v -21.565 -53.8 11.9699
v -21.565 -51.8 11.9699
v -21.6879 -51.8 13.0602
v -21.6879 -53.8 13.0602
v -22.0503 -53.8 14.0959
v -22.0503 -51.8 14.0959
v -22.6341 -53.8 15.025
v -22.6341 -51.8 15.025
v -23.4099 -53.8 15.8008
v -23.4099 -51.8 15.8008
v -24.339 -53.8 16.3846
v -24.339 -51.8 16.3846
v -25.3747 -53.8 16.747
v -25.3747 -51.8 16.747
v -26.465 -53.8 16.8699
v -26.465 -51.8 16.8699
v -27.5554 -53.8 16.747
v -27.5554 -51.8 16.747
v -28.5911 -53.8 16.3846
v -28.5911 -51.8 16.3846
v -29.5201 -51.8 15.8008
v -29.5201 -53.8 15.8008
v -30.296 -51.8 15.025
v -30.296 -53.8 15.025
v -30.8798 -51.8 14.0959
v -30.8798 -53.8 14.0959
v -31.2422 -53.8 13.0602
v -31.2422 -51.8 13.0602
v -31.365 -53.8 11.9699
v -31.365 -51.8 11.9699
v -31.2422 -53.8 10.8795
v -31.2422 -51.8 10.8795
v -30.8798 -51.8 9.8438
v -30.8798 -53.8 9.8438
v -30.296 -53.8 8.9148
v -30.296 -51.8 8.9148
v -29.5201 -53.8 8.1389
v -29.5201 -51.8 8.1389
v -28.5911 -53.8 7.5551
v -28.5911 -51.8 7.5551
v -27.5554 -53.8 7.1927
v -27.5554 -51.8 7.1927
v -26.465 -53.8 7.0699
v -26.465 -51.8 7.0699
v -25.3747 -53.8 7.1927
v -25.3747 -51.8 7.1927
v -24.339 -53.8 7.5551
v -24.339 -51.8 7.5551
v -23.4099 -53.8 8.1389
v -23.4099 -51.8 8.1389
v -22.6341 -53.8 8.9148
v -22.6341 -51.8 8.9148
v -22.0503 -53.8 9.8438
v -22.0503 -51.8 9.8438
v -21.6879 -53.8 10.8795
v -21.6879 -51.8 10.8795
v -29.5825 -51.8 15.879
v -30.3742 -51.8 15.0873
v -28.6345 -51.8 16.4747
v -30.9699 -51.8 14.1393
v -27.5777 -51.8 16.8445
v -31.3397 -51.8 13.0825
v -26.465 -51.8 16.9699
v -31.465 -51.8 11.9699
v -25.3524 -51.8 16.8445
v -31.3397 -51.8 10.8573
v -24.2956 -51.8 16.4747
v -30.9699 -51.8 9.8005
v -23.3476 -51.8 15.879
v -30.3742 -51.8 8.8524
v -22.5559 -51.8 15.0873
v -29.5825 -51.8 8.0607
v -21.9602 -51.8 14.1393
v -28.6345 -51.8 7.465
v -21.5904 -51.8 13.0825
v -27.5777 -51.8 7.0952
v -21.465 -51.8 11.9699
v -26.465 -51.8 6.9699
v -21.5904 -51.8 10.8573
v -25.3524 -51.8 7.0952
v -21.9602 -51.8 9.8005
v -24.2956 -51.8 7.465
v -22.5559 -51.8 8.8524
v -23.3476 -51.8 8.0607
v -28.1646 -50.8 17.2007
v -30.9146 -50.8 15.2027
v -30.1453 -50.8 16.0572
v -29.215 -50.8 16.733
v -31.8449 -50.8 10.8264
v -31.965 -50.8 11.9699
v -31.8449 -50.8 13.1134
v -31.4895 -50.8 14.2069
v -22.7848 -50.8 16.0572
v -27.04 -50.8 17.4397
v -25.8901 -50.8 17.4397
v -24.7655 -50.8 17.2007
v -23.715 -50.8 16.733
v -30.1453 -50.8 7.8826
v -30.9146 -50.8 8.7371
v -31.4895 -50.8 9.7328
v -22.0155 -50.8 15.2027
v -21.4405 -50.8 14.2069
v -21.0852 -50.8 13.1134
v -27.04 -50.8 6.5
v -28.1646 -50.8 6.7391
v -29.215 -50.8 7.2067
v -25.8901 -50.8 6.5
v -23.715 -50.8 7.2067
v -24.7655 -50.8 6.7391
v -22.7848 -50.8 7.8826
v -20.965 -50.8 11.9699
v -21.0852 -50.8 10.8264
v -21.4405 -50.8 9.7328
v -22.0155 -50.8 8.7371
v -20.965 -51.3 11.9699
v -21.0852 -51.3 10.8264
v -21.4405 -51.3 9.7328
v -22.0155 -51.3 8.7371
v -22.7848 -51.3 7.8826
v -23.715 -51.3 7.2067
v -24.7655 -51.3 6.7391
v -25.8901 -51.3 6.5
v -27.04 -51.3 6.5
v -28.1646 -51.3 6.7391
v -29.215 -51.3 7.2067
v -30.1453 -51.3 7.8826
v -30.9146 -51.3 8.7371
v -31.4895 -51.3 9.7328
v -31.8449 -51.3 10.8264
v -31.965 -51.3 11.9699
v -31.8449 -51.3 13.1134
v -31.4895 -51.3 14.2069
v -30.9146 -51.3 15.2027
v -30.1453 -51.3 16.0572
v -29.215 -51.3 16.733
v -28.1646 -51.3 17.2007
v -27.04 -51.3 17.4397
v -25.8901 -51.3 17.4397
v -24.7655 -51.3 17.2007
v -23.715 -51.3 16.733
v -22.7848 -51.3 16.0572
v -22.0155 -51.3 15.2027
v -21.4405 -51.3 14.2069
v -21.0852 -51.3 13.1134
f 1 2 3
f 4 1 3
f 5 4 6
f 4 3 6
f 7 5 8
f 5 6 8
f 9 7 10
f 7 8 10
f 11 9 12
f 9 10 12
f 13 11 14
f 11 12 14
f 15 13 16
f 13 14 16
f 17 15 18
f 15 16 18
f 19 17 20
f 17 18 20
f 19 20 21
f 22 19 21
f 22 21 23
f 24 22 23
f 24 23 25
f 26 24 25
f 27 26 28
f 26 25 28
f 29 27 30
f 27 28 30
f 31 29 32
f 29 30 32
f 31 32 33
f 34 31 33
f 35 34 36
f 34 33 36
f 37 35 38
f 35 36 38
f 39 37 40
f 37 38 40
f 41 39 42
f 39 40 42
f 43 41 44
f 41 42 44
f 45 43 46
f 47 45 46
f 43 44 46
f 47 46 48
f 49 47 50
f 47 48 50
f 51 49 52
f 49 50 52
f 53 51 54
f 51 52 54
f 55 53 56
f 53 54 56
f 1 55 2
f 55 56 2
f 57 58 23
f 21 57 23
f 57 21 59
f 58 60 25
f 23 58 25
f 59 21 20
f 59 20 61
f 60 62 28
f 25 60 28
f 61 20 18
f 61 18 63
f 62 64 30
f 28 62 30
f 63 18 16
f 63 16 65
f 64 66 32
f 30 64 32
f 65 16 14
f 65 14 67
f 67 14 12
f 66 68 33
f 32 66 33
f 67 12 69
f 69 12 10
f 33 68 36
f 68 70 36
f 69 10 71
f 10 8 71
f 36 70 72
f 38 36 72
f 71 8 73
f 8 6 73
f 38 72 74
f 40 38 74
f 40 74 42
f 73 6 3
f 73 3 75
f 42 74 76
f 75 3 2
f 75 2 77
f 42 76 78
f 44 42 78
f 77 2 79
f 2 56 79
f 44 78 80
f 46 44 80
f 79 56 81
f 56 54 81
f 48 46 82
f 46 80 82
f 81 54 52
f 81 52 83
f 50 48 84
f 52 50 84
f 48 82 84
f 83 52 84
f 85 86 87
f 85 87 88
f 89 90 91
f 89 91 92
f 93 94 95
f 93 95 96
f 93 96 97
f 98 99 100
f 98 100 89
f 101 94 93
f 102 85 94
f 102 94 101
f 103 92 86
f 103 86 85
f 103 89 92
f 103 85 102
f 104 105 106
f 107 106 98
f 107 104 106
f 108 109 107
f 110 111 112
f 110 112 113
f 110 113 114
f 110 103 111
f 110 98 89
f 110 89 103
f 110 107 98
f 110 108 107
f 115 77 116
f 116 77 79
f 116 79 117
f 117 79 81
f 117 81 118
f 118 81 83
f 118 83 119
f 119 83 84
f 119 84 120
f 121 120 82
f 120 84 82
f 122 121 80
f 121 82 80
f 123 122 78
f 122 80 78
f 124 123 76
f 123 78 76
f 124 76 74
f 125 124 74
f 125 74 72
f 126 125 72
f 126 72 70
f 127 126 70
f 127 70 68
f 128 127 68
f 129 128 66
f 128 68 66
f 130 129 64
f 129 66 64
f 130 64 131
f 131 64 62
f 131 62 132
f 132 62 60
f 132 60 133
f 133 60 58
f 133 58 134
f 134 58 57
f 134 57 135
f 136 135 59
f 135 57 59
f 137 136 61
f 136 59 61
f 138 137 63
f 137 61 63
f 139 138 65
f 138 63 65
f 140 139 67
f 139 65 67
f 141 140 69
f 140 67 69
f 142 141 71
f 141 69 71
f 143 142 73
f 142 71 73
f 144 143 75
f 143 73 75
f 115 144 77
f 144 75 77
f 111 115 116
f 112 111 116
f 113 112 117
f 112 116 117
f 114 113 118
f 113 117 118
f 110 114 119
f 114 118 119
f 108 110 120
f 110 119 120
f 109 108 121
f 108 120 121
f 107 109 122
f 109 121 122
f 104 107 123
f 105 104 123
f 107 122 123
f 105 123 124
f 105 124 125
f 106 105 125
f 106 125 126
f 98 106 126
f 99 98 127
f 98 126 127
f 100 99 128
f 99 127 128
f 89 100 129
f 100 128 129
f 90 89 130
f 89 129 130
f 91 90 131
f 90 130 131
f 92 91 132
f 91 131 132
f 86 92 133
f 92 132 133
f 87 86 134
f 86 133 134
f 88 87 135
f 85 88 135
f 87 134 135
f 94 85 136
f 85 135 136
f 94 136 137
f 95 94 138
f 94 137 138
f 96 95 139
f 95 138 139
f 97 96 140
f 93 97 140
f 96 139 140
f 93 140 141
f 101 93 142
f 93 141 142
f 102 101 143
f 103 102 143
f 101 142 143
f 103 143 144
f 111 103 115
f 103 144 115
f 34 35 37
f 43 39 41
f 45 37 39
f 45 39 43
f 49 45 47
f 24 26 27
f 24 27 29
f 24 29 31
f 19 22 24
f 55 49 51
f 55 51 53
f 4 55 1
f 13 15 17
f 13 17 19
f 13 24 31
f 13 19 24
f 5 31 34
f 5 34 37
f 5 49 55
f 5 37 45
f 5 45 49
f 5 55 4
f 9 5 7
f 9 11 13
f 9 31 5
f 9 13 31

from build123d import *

# Parameters (mm, degrees)
SKETCH003_R     = 4.9
PAD002_DEPTH    = 2
SKETCH004_R     = 5.5
PAD003_DEPTH    = 1
CHAMFER005_SIZE = 0.5


with BuildPart() as part:
    # Sketch003 → Pad002 (new body)
    with BuildSketch(Plane.XZ):
        with Locations((-27.765049, 49.769871)):
            Circle(SKETCH003_R)
    extrude(amount=PAD002_DEPTH)

    # Sketch004 (on Face2 of Pad002) → Pad003 (join)
    with BuildSketch(Plane(origin=(0, 0, 0), x_dir=(1, 0, 0), z_dir=(0, 1, 0))):
        with Locations((-27.765049, -49.769871)):
            Circle(SKETCH004_R)
    extrude(amount=PAD003_DEPTH)

    # Chamfer005
    chamfer005_edges = [part.edges().sort_by_distance(p)[0] for p in [
        (-33.265049, 0, 49.769871),
    ]]
    chamfer(chamfer005_edges, length=CHAMFER005_SIZE)


with BuildPart() as part_1:
    # Body001 placement: moved
    add(part.part.moved(Location((1.3, -51.8, -37.8))))


solid = part_1.part
